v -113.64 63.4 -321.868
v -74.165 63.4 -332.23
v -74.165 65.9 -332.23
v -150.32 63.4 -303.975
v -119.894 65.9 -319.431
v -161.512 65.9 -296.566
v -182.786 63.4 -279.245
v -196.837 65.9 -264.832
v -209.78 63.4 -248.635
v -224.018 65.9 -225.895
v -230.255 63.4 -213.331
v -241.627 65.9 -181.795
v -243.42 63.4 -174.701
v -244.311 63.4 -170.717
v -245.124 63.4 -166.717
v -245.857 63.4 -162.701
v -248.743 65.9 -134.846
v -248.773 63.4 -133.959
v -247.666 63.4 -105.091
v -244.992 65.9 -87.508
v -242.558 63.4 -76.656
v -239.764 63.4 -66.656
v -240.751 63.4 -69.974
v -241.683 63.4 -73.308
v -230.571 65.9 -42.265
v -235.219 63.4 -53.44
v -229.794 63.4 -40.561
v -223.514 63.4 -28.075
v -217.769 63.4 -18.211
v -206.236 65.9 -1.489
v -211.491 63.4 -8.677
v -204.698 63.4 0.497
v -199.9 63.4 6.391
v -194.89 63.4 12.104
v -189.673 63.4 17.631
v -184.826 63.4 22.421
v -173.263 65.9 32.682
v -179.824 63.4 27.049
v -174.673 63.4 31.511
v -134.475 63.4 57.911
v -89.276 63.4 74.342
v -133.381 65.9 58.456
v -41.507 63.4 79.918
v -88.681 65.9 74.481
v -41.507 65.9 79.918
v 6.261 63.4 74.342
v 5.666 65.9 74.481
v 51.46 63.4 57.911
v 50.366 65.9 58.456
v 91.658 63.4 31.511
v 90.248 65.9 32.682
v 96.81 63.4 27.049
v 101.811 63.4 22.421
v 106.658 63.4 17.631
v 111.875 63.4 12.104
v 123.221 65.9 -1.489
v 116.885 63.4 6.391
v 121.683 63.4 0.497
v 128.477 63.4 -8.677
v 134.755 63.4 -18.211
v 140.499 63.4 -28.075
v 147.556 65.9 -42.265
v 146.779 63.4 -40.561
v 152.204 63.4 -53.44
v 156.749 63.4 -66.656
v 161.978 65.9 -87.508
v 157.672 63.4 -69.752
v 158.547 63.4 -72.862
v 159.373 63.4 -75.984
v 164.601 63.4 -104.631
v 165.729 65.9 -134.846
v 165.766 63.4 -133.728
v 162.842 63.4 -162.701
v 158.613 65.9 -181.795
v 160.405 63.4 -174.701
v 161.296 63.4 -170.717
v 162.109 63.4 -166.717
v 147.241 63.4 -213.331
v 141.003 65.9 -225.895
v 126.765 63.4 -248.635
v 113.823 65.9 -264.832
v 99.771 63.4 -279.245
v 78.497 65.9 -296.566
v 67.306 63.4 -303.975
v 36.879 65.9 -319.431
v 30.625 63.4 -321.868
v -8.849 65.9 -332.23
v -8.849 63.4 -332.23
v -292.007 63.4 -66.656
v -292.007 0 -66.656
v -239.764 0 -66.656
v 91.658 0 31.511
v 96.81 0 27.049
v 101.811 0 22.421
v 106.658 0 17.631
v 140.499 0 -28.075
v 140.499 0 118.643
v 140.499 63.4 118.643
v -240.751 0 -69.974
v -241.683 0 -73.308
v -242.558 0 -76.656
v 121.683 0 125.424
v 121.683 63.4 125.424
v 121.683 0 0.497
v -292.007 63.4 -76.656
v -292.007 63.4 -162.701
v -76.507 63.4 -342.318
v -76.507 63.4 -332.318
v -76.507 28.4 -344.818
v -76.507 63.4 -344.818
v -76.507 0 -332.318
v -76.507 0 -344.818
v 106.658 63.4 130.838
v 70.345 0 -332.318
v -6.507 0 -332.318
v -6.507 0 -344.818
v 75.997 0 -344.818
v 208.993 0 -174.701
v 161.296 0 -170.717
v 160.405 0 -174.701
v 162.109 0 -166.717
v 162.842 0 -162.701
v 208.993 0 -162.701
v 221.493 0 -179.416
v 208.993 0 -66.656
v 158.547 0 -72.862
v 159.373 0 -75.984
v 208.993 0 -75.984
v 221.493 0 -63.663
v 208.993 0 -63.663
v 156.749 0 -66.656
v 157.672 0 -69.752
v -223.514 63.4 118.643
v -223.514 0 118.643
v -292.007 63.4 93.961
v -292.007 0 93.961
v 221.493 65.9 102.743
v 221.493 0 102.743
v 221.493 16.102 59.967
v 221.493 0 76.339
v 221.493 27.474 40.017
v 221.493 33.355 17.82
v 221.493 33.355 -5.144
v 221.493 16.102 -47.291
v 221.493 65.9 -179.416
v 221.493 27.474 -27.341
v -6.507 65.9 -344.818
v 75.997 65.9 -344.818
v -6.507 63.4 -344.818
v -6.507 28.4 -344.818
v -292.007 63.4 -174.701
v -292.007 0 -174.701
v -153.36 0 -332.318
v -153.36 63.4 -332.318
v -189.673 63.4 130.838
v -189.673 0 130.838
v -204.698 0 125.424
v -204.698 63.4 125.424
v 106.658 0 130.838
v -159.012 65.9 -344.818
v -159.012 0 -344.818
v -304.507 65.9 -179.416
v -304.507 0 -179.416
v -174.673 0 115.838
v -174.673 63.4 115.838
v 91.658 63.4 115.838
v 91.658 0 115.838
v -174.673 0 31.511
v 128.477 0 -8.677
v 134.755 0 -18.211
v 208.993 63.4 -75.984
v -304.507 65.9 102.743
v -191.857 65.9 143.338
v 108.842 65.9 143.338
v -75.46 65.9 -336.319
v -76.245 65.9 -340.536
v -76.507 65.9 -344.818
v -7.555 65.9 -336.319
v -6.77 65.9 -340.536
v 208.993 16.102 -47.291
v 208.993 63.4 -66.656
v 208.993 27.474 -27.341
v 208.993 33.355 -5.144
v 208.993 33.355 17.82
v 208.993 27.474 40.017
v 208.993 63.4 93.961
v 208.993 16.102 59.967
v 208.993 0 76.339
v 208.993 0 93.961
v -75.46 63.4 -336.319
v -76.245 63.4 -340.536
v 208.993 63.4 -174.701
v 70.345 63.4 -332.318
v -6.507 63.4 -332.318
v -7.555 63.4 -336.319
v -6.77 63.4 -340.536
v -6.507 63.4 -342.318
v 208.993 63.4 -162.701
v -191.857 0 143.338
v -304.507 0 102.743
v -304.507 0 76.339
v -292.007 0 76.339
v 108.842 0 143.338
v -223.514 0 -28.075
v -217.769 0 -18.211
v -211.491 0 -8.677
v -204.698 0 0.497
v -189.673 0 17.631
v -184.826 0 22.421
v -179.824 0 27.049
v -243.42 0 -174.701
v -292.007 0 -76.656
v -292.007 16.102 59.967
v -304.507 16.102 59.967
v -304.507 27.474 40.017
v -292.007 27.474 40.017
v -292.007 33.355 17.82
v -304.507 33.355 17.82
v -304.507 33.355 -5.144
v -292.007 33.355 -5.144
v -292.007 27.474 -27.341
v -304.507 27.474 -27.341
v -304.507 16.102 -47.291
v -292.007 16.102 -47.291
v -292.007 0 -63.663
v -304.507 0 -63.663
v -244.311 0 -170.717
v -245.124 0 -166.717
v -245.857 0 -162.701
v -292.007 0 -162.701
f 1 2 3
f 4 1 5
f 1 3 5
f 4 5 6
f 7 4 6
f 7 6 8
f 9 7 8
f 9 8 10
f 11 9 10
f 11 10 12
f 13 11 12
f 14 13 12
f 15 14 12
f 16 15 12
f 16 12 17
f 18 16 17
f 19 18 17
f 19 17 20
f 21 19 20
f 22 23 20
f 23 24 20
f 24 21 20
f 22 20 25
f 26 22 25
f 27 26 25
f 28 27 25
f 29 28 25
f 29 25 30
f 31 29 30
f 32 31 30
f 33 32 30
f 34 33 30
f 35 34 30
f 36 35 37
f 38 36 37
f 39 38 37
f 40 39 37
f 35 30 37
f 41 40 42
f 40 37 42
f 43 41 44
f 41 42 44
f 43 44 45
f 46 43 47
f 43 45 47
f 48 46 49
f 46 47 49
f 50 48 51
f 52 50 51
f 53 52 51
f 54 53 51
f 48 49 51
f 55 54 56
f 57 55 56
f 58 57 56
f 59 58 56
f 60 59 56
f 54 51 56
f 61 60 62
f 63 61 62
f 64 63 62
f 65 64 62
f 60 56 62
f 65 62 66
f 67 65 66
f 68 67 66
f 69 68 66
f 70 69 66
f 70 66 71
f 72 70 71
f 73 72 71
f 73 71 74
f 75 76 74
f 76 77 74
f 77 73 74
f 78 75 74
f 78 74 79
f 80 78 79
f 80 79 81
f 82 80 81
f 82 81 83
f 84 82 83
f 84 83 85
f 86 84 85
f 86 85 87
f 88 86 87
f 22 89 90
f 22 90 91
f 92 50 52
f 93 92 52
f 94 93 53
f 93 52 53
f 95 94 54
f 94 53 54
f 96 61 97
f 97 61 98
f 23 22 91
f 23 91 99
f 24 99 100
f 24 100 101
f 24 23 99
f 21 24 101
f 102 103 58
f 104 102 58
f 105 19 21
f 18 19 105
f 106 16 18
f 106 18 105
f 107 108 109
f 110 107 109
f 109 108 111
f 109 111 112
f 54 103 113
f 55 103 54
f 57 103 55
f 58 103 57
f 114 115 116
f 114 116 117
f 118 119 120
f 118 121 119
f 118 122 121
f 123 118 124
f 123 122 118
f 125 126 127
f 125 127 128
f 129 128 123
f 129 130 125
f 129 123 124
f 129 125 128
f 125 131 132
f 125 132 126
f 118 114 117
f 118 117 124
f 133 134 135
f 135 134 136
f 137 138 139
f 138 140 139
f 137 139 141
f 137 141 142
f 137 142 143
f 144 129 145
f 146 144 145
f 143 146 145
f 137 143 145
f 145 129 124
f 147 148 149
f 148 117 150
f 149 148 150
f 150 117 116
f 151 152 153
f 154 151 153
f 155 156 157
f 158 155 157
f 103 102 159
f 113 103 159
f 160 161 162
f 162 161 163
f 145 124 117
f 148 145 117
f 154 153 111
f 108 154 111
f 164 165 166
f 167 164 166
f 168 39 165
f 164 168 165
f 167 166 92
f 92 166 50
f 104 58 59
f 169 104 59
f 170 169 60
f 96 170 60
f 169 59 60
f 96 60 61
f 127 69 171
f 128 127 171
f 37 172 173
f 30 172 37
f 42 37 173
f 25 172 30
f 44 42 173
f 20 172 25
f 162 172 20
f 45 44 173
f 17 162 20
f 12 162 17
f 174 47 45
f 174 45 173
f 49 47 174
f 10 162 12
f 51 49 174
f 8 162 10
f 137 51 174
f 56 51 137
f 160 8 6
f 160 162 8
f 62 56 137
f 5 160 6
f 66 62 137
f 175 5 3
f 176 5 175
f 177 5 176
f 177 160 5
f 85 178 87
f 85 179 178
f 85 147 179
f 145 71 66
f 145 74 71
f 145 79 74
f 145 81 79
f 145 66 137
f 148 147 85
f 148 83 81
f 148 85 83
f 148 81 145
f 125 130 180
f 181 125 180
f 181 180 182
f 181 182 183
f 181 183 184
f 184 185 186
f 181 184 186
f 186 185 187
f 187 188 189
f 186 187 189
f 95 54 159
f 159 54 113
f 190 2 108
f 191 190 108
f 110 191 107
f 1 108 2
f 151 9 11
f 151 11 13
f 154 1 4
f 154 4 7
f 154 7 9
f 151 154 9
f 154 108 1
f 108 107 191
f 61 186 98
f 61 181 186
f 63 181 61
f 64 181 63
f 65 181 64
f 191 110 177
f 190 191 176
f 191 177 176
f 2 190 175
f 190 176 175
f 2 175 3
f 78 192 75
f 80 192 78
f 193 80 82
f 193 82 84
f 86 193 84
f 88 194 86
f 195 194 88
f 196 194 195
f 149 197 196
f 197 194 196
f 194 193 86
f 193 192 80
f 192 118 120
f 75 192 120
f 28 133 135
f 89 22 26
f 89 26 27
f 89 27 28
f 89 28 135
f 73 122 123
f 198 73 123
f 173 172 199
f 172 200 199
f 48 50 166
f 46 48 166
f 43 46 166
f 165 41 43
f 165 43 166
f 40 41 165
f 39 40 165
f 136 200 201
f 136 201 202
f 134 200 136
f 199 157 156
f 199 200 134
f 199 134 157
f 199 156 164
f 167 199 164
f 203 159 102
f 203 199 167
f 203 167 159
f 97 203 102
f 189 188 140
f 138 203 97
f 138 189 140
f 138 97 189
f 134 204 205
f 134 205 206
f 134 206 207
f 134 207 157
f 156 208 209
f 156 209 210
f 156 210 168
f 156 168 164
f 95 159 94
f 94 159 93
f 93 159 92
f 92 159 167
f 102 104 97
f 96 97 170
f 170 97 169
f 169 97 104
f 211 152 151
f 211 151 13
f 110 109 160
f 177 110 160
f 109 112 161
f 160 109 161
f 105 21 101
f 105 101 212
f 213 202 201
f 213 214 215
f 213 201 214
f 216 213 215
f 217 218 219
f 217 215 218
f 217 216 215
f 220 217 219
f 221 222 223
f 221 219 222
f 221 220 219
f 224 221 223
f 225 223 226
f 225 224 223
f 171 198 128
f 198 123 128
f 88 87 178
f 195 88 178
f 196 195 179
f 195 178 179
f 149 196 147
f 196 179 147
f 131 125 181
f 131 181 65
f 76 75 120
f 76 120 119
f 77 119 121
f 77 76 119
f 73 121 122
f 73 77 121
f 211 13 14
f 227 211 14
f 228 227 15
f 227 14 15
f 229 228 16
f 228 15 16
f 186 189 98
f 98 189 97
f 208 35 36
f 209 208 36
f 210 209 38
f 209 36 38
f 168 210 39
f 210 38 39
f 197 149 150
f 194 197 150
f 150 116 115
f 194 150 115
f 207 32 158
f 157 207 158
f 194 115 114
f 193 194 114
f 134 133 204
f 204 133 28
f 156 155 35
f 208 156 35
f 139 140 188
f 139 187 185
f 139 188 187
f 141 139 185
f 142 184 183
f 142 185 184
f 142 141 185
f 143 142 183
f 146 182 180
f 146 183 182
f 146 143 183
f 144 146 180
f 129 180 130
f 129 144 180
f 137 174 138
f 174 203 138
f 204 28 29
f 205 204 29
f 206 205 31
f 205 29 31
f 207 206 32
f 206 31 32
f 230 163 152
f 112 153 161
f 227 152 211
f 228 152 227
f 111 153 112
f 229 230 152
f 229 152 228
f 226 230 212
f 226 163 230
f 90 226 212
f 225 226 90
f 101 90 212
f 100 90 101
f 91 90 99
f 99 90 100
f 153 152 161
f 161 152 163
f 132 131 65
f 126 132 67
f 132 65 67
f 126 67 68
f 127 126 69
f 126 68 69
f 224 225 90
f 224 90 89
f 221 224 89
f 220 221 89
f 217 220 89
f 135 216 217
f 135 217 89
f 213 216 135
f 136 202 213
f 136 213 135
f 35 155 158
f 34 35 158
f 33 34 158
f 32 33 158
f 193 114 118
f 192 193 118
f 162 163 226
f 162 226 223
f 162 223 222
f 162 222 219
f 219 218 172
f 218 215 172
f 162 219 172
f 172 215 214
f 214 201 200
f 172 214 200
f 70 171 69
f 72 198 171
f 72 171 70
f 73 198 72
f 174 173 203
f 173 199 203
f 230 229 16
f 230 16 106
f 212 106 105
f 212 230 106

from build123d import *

# Parameters (mm, degrees)
BOSS_EXTRUDE1_DEPTH     = 63.399999946
BOSS_EXTRUDE2_DEPTH     = 63.399999946
BOSS_EXTRUDE3_DEPTH     = 5
BOSS_EXTRUDE4_DEPTH     = 2.5
SKETCH8_W               = 50.000000076
SKETCH8_H               = 34.99999985
CUT_EXTRUDE2_DEPTH      = 12.5
CUT_EXTRUDE4_DEPTH      = 2.5
SKETCH10_W              = 9.999999939
SKETCH10_H              = 34.99999985
CUT_EXTRUDE5_DEPTH      = 2.5
BOSS_EXTRUDE6_DEPTH     = 58.399999946
BOSS_EXTRUDE7_DEPTH     = 63.399999946
CUT_EXTRUDE8_DEPTH      = 633.390638366
CUT_EXTRUDE8_DEPTH_BACK = 633.390638366
SKETCH13_R              = 207.367939984
CUT_EXTRUDE9_DEPTH      = 465.722133037
BOSS_EXTRUDE15_DEPTH    = 63.4


with BuildPart() as part:
    # Sketch1 → Boss-Extrude1 (new body)
    with BuildSketch(Plane(origin=(0, 0, 0), x_dir=(1, 0, 0), z_dir=(0, 1, 0))):
        Polygon((-304.507375635, 63.663075045), (-304.507375635, -102.743315535), (-191.856739857, -143.33813924), (108.841988943, -143.33813924), (221.492624721, -102.743315535), (221.492624721, 63.663075045), (218.992624721, 63.663075045), (218.992624721, -100.986845182), (108.405283491, -140.83813932), (-191.420034405, -140.83813932), (-302.007375635, -100.986845182), (-302.007375635, 63.663075045), align=None)
    extrude(amount=BOSS_EXTRUDE1_DEPTH)



with BuildPart() as body_2:
    # Sketch3 → Boss-Extrude2 (new body)
    with BuildSketch(Plane(origin=(0, 0, 0), x_dir=(1, 0, 0), z_dir=(0, 1, 0))):
        Polygon((-304.507375635, 179.416332489), (-159.011838483, 344.817501188), (75.997087569, 344.817501188), (221.492624721, 179.416332489), (221.492624721, 63.663075045), (218.992624721, 63.663075045), (218.992624721, 178.473242754), (74.866627441, 342.317501188), (-157.881378355, 342.317501188), (-302.007375635, 178.473242754), (-302.007375635, 63.663075045), (-304.507375635, 63.663075045), align=None)
    extrude(amount=BOSS_EXTRUDE2_DEPTH)


with BuildPart() as part_1:
    add(part.part)

    add(body_2.part)  # Boss-Extrude3 merges body 2
    # Sketch5 → Boss-Extrude3 (add)
    with BuildSketch(Plane(origin=(0, 0, 0), x_dir=(1, 0, 0), z_dir=(0, 1, 0))):
        Polygon((208.992624721, 174.700883815), (208.992624721, 63.663075045), (218.992624721, 63.663075045), (218.992624721, 178.473242754), (74.866627441, 342.317501188), (-157.881378355, 342.317501188), (-302.007375635, 178.473242754), (-302.007375635, 63.663075045), (-292.007375635, 63.663075045), (-292.007375635, 174.700883815), (-153.359537842, 332.317501188), (70.344786927, 332.317501188), align=None)
        Polygon((215.602428975, -91.579051987), (106.658461628, -130.83813932), (-189.673212543, -130.83813932), (-298.617179889, -91.579051987), (-302.007375635, -100.986845182), (-191.420034405, -140.83813932), (108.405283491, -140.83813932), (218.992624721, -100.986845182), align=None)
    extrude(amount=BOSS_EXTRUDE3_DEPTH)

    # Sketch6 → Boss-Extrude4 (add)
    with BuildSketch(Plane(origin=(0, 63.399999946, 0), x_dir=(1, 0, 0), z_dir=(0, 1, 0))):
        Polygon((-159.011838483, 344.817501188), (-304.507375635, 179.416332489), (-304.507375635, -102.743315535), (-191.856739857, -143.33813924), (108.841988943, -143.33813924), (221.492624721, -102.743315535), (221.492624721, 179.416332489), (75.997087569, 344.817501188), align=None)
    extrude(amount=BOSS_EXTRUDE4_DEPTH)

    # Sketch8 → Cut-Extrude2 (cut)
    with BuildSketch(Plane(origin=(0, 0, -344.817501188), x_dir=(-1, 0, 0), z_dir=(0, 0, -1))):
        Polygon((6.50737548, 28.400000096), (6.50737548, 0), (76.507375434, 0), (76.507375434, 28.400000096), (66.507375495, 28.400000096), (16.507375419, 28.400000096), align=None)
        with Locations((41.507375457, 45.900000021)):
            Rectangle(SKETCH8_W, SKETCH8_H)
    extrude(amount=-CUT_EXTRUDE2_DEPTH, mode=Mode.SUBTRACT)

    # Sketch9 → Cut-Extrude4 (cut)
    with BuildSketch(Plane(origin=(0, 65.899999946, 0), x_dir=(1, 0, 0), z_dir=(0, 1, 0))):
        with BuildLine():
            ThreePointArc((-76.507375434, 344.817501188), (-41.507375457, 309.817501211), (-6.50737548, 344.817501188))
            Line((-6.50737548, 344.817501188), (-16.507375419, 344.817501188))
            Line((-16.507375419, 344.817501188), (-66.507375495, 344.817501188))
            Line((-66.507375495, 344.817501188), (-76.507375434, 344.817501188))
        make_face()
        with BuildLine():
            Line((-16.507375419, 344.817501188), (-6.50737548, 344.817501188))
            ThreePointArc((-6.50737548, 344.817501188), (-41.507375457, 379.817501165), (-76.507375434, 344.817501188))
            Line((-76.507375434, 344.817501188), (-66.507375495, 344.817501188))
            Line((-66.507375495, 344.817501188), (-16.507375419, 344.817501188))
        make_face()
    extrude(amount=-CUT_EXTRUDE4_DEPTH, mode=Mode.SUBTRACT)

    # Sketch10 → Cut-Extrude5 (cut)
    with BuildSketch(Plane(origin=(0, 0, -344.817501188), x_dir=(-1, 0, 0), z_dir=(0, 0, -1))):
        with Locations((11.50737545, 45.900000021)):
            Rectangle(SKETCH10_W, SKETCH10_H)
        with Locations((71.507375465, 45.900000021)):
            Rectangle(SKETCH10_W, SKETCH10_H)
    extrude(amount=-CUT_EXTRUDE5_DEPTH, mode=Mode.SUBTRACT)

    # Sketch11 → Boss-Extrude6 (add)
    with BuildSketch(Plane(origin=(0, 5, 0), x_dir=(1, 0, 0), z_dir=(0, 1, 0))):
        Polygon((-76.507375434, 332.317501188), (-76.507375434, 342.317501188), (-157.881378355, 342.317501188), (-302.007375635, 178.473242754), (-302.007375635, 63.663075045), (-292.007375635, 63.663075045), (-292.007375635, 174.700883815), (-153.359537842, 332.317501188), align=None)
        Polygon((208.992624721, 63.663075045), (218.992624721, 63.663075045), (218.992624721, 178.473242754), (74.866627441, 342.317501188), (-6.50737548, 342.317501188), (-6.50737548, 332.317501188), (70.344786927, 332.317501188), (208.992624721, 174.700883815), align=None)
        Polygon((108.405283491, -140.83813932), (218.992624721, -100.986845182), (215.602428975, -91.579051987), (106.658461628, -130.83813932), (-189.673212543, -130.83813932), (-298.617179889, -91.579051987), (-302.007375635, -100.986845182), (-191.420034405, -140.83813932), align=None)
    extrude(amount=BOSS_EXTRUDE6_DEPTH)

    # Sketch12 → Boss-Extrude7 (add)
    with BuildSketch(Plane.XZ):
        Polygon((-302.007375635, 100.986845182), (-302.007375635, -63.663075045), (-292.007375635, -63.663075045), (-292.007375635, 93.96096343), (-298.617179889, 91.579051987), align=None)
        Polygon((218.992624721, 100.986845182), (218.992624721, -63.663075045), (208.992624721, -63.663075045), (208.992624721, 93.96096343), (215.602428975, 91.579051987), align=None)
    extrude(amount=-BOSS_EXTRUDE7_DEPTH)

    # Sketch2 → Cut-Extrude8 (cut, two sides: drawn at the far end of the back side and taken through both)
    with BuildSketch(Plane.ZY.offset(304.507375635).offset(-CUT_EXTRUDE8_DEPTH_BACK)):
        with BuildLine():
            ThreePointArc((-63.663075045, 0), (-22.645494652, -138.842602216), (95.238139156, -54.800000095))
            ThreePointArc((95.238139156, -54.800000095), (90.380741277, -25.816366286), (76.339353357, 0))
            Line((76.339353357, 0), (-63.663075045, 0))
        make_face()
        with BuildLine():
            Line((-63.663075045, 0), (76.339353357, 0))
            ThreePointArc((76.339353357, 0), (6.338139156, 34.099999905), (-63.663075045, 0))
        make_face()
    extrude(amount=CUT_EXTRUDE8_DEPTH + CUT_EXTRUDE8_DEPTH_BACK, mode=Mode.SUBTRACT)

    # Sketch13 → Cut-Extrude9 (cut, through all)
    with BuildSketch(Plane(origin=(0, 65.899999946, 0), x_dir=(1, 0, 0), z_dir=(0, 1, 0))):
        with Locations((-41.507375457, 127.449561204)):
            Circle(SKETCH13_R)
    extrude(amount=-CUT_EXTRUDE9_DEPTH, mode=Mode.SUBTRACT)

    # Sketch16 → Boss-Extrude15 (add, through all)
    with BuildSketch(Plane.XZ.offset(-63.399999946)):
        with BuildLine():
            Line((-292.007375635, -174.700883815), (-243.420166148, -174.700883815))
            ThreePointArc((-243.420166148, -174.700883815), (-244.727222578, -168.718875101), (-245.857092333, -162.700883815))
            Line((-245.857092333, -162.700883815), (-292.007375635, -162.700883815))
            Line((-292.007375635, -162.700883815), (-292.007375635, -174.700883815))
        make_face()
        with BuildLine():
            Line((-292.007375635, -66.656438986), (-239.763923455, -66.656438986))
            ThreePointArc((-239.763923455, -66.656438986), (-241.223768745, -71.638945859), (-242.558416908, -76.656438986))
            Line((-242.558416908, -76.656438986), (-292.007375635, -76.656438986))
            Line((-292.007375635, -76.656438986), (-292.007375635, -66.656438986))
        make_face()
        with BuildLine():
            Line((-223.513560978, 118.643419163), (-223.513560978, -28.075465156))
            ThreePointArc((-223.513560978, -28.075465156), (-214.696000108, -13.400611956), (-204.697974588, 0.496876373))
            Line((-204.697974588, 0.496876373), (-204.697974588, 125.423810655))
            Line((-204.697974588, 125.423810655), (-223.513560978, 118.643419163))
        make_face()
        with BuildLine():
            Line((-189.673212543, 130.83813932), (-189.673212543, 17.63092423))
            ThreePointArc((-189.673212543, 17.63092423), (-182.344298329, 24.755641365), (-174.673212543, 31.510567025))
            Line((-174.673212543, 31.510567025), (-174.673212543, 115.83813932))
            Line((-174.673212543, 115.83813932), (91.658461628, 115.83813932))
            Line((91.658461628, 115.83813932), (91.658461628, 31.510567025))
            ThreePointArc((91.658461628, 31.510567025), (99.329547415, 24.755641365), (106.658461628, 17.63092423))
            Line((106.658461628, 17.63092423), (106.658461628, 130.83813932))
            Line((106.658461628, 130.83813932), (-189.673212543, 130.83813932))
        make_face()
        with BuildLine():
            Line((121.683223673, 125.423810655), (121.683223673, 0.496876373))
            ThreePointArc((121.683223673, 0.496876373), (131.681249194, -13.400611956), (140.498810064, -28.075465156))
            Line((140.498810064, -28.075465156), (140.498810064, 118.643419163))
            Line((140.498810064, 118.643419163), (121.683223673, 125.423810655))
        make_face()
        with BuildLine():
            Line((208.992624721, -66.656438986), (156.749172541, -66.656438986))
            ThreePointArc((156.749172541, -66.656438986), (158.115408542, -71.30504552), (159.372662829, -75.984303492))
            Line((159.372662829, -75.984303492), (208.992624721, -75.984303492))
            Line((208.992624721, -75.984303492), (208.992624721, -66.656438986))
        make_face()
        with BuildLine():
            Line((208.992624721, -174.700883815), (160.405415234, -174.700883815))
            ThreePointArc((160.405415234, -174.700883815), (161.712471663, -168.718875101), (162.842341419, -162.700883815))
            Line((162.842341419, -162.700883815), (208.992624721, -162.700883815))
            Line((208.992624721, -162.700883815), (208.992624721, -174.700883815))
        make_face()
    extrude(amount=BOSS_EXTRUDE15_DEPTH)


solid = part_1.part
